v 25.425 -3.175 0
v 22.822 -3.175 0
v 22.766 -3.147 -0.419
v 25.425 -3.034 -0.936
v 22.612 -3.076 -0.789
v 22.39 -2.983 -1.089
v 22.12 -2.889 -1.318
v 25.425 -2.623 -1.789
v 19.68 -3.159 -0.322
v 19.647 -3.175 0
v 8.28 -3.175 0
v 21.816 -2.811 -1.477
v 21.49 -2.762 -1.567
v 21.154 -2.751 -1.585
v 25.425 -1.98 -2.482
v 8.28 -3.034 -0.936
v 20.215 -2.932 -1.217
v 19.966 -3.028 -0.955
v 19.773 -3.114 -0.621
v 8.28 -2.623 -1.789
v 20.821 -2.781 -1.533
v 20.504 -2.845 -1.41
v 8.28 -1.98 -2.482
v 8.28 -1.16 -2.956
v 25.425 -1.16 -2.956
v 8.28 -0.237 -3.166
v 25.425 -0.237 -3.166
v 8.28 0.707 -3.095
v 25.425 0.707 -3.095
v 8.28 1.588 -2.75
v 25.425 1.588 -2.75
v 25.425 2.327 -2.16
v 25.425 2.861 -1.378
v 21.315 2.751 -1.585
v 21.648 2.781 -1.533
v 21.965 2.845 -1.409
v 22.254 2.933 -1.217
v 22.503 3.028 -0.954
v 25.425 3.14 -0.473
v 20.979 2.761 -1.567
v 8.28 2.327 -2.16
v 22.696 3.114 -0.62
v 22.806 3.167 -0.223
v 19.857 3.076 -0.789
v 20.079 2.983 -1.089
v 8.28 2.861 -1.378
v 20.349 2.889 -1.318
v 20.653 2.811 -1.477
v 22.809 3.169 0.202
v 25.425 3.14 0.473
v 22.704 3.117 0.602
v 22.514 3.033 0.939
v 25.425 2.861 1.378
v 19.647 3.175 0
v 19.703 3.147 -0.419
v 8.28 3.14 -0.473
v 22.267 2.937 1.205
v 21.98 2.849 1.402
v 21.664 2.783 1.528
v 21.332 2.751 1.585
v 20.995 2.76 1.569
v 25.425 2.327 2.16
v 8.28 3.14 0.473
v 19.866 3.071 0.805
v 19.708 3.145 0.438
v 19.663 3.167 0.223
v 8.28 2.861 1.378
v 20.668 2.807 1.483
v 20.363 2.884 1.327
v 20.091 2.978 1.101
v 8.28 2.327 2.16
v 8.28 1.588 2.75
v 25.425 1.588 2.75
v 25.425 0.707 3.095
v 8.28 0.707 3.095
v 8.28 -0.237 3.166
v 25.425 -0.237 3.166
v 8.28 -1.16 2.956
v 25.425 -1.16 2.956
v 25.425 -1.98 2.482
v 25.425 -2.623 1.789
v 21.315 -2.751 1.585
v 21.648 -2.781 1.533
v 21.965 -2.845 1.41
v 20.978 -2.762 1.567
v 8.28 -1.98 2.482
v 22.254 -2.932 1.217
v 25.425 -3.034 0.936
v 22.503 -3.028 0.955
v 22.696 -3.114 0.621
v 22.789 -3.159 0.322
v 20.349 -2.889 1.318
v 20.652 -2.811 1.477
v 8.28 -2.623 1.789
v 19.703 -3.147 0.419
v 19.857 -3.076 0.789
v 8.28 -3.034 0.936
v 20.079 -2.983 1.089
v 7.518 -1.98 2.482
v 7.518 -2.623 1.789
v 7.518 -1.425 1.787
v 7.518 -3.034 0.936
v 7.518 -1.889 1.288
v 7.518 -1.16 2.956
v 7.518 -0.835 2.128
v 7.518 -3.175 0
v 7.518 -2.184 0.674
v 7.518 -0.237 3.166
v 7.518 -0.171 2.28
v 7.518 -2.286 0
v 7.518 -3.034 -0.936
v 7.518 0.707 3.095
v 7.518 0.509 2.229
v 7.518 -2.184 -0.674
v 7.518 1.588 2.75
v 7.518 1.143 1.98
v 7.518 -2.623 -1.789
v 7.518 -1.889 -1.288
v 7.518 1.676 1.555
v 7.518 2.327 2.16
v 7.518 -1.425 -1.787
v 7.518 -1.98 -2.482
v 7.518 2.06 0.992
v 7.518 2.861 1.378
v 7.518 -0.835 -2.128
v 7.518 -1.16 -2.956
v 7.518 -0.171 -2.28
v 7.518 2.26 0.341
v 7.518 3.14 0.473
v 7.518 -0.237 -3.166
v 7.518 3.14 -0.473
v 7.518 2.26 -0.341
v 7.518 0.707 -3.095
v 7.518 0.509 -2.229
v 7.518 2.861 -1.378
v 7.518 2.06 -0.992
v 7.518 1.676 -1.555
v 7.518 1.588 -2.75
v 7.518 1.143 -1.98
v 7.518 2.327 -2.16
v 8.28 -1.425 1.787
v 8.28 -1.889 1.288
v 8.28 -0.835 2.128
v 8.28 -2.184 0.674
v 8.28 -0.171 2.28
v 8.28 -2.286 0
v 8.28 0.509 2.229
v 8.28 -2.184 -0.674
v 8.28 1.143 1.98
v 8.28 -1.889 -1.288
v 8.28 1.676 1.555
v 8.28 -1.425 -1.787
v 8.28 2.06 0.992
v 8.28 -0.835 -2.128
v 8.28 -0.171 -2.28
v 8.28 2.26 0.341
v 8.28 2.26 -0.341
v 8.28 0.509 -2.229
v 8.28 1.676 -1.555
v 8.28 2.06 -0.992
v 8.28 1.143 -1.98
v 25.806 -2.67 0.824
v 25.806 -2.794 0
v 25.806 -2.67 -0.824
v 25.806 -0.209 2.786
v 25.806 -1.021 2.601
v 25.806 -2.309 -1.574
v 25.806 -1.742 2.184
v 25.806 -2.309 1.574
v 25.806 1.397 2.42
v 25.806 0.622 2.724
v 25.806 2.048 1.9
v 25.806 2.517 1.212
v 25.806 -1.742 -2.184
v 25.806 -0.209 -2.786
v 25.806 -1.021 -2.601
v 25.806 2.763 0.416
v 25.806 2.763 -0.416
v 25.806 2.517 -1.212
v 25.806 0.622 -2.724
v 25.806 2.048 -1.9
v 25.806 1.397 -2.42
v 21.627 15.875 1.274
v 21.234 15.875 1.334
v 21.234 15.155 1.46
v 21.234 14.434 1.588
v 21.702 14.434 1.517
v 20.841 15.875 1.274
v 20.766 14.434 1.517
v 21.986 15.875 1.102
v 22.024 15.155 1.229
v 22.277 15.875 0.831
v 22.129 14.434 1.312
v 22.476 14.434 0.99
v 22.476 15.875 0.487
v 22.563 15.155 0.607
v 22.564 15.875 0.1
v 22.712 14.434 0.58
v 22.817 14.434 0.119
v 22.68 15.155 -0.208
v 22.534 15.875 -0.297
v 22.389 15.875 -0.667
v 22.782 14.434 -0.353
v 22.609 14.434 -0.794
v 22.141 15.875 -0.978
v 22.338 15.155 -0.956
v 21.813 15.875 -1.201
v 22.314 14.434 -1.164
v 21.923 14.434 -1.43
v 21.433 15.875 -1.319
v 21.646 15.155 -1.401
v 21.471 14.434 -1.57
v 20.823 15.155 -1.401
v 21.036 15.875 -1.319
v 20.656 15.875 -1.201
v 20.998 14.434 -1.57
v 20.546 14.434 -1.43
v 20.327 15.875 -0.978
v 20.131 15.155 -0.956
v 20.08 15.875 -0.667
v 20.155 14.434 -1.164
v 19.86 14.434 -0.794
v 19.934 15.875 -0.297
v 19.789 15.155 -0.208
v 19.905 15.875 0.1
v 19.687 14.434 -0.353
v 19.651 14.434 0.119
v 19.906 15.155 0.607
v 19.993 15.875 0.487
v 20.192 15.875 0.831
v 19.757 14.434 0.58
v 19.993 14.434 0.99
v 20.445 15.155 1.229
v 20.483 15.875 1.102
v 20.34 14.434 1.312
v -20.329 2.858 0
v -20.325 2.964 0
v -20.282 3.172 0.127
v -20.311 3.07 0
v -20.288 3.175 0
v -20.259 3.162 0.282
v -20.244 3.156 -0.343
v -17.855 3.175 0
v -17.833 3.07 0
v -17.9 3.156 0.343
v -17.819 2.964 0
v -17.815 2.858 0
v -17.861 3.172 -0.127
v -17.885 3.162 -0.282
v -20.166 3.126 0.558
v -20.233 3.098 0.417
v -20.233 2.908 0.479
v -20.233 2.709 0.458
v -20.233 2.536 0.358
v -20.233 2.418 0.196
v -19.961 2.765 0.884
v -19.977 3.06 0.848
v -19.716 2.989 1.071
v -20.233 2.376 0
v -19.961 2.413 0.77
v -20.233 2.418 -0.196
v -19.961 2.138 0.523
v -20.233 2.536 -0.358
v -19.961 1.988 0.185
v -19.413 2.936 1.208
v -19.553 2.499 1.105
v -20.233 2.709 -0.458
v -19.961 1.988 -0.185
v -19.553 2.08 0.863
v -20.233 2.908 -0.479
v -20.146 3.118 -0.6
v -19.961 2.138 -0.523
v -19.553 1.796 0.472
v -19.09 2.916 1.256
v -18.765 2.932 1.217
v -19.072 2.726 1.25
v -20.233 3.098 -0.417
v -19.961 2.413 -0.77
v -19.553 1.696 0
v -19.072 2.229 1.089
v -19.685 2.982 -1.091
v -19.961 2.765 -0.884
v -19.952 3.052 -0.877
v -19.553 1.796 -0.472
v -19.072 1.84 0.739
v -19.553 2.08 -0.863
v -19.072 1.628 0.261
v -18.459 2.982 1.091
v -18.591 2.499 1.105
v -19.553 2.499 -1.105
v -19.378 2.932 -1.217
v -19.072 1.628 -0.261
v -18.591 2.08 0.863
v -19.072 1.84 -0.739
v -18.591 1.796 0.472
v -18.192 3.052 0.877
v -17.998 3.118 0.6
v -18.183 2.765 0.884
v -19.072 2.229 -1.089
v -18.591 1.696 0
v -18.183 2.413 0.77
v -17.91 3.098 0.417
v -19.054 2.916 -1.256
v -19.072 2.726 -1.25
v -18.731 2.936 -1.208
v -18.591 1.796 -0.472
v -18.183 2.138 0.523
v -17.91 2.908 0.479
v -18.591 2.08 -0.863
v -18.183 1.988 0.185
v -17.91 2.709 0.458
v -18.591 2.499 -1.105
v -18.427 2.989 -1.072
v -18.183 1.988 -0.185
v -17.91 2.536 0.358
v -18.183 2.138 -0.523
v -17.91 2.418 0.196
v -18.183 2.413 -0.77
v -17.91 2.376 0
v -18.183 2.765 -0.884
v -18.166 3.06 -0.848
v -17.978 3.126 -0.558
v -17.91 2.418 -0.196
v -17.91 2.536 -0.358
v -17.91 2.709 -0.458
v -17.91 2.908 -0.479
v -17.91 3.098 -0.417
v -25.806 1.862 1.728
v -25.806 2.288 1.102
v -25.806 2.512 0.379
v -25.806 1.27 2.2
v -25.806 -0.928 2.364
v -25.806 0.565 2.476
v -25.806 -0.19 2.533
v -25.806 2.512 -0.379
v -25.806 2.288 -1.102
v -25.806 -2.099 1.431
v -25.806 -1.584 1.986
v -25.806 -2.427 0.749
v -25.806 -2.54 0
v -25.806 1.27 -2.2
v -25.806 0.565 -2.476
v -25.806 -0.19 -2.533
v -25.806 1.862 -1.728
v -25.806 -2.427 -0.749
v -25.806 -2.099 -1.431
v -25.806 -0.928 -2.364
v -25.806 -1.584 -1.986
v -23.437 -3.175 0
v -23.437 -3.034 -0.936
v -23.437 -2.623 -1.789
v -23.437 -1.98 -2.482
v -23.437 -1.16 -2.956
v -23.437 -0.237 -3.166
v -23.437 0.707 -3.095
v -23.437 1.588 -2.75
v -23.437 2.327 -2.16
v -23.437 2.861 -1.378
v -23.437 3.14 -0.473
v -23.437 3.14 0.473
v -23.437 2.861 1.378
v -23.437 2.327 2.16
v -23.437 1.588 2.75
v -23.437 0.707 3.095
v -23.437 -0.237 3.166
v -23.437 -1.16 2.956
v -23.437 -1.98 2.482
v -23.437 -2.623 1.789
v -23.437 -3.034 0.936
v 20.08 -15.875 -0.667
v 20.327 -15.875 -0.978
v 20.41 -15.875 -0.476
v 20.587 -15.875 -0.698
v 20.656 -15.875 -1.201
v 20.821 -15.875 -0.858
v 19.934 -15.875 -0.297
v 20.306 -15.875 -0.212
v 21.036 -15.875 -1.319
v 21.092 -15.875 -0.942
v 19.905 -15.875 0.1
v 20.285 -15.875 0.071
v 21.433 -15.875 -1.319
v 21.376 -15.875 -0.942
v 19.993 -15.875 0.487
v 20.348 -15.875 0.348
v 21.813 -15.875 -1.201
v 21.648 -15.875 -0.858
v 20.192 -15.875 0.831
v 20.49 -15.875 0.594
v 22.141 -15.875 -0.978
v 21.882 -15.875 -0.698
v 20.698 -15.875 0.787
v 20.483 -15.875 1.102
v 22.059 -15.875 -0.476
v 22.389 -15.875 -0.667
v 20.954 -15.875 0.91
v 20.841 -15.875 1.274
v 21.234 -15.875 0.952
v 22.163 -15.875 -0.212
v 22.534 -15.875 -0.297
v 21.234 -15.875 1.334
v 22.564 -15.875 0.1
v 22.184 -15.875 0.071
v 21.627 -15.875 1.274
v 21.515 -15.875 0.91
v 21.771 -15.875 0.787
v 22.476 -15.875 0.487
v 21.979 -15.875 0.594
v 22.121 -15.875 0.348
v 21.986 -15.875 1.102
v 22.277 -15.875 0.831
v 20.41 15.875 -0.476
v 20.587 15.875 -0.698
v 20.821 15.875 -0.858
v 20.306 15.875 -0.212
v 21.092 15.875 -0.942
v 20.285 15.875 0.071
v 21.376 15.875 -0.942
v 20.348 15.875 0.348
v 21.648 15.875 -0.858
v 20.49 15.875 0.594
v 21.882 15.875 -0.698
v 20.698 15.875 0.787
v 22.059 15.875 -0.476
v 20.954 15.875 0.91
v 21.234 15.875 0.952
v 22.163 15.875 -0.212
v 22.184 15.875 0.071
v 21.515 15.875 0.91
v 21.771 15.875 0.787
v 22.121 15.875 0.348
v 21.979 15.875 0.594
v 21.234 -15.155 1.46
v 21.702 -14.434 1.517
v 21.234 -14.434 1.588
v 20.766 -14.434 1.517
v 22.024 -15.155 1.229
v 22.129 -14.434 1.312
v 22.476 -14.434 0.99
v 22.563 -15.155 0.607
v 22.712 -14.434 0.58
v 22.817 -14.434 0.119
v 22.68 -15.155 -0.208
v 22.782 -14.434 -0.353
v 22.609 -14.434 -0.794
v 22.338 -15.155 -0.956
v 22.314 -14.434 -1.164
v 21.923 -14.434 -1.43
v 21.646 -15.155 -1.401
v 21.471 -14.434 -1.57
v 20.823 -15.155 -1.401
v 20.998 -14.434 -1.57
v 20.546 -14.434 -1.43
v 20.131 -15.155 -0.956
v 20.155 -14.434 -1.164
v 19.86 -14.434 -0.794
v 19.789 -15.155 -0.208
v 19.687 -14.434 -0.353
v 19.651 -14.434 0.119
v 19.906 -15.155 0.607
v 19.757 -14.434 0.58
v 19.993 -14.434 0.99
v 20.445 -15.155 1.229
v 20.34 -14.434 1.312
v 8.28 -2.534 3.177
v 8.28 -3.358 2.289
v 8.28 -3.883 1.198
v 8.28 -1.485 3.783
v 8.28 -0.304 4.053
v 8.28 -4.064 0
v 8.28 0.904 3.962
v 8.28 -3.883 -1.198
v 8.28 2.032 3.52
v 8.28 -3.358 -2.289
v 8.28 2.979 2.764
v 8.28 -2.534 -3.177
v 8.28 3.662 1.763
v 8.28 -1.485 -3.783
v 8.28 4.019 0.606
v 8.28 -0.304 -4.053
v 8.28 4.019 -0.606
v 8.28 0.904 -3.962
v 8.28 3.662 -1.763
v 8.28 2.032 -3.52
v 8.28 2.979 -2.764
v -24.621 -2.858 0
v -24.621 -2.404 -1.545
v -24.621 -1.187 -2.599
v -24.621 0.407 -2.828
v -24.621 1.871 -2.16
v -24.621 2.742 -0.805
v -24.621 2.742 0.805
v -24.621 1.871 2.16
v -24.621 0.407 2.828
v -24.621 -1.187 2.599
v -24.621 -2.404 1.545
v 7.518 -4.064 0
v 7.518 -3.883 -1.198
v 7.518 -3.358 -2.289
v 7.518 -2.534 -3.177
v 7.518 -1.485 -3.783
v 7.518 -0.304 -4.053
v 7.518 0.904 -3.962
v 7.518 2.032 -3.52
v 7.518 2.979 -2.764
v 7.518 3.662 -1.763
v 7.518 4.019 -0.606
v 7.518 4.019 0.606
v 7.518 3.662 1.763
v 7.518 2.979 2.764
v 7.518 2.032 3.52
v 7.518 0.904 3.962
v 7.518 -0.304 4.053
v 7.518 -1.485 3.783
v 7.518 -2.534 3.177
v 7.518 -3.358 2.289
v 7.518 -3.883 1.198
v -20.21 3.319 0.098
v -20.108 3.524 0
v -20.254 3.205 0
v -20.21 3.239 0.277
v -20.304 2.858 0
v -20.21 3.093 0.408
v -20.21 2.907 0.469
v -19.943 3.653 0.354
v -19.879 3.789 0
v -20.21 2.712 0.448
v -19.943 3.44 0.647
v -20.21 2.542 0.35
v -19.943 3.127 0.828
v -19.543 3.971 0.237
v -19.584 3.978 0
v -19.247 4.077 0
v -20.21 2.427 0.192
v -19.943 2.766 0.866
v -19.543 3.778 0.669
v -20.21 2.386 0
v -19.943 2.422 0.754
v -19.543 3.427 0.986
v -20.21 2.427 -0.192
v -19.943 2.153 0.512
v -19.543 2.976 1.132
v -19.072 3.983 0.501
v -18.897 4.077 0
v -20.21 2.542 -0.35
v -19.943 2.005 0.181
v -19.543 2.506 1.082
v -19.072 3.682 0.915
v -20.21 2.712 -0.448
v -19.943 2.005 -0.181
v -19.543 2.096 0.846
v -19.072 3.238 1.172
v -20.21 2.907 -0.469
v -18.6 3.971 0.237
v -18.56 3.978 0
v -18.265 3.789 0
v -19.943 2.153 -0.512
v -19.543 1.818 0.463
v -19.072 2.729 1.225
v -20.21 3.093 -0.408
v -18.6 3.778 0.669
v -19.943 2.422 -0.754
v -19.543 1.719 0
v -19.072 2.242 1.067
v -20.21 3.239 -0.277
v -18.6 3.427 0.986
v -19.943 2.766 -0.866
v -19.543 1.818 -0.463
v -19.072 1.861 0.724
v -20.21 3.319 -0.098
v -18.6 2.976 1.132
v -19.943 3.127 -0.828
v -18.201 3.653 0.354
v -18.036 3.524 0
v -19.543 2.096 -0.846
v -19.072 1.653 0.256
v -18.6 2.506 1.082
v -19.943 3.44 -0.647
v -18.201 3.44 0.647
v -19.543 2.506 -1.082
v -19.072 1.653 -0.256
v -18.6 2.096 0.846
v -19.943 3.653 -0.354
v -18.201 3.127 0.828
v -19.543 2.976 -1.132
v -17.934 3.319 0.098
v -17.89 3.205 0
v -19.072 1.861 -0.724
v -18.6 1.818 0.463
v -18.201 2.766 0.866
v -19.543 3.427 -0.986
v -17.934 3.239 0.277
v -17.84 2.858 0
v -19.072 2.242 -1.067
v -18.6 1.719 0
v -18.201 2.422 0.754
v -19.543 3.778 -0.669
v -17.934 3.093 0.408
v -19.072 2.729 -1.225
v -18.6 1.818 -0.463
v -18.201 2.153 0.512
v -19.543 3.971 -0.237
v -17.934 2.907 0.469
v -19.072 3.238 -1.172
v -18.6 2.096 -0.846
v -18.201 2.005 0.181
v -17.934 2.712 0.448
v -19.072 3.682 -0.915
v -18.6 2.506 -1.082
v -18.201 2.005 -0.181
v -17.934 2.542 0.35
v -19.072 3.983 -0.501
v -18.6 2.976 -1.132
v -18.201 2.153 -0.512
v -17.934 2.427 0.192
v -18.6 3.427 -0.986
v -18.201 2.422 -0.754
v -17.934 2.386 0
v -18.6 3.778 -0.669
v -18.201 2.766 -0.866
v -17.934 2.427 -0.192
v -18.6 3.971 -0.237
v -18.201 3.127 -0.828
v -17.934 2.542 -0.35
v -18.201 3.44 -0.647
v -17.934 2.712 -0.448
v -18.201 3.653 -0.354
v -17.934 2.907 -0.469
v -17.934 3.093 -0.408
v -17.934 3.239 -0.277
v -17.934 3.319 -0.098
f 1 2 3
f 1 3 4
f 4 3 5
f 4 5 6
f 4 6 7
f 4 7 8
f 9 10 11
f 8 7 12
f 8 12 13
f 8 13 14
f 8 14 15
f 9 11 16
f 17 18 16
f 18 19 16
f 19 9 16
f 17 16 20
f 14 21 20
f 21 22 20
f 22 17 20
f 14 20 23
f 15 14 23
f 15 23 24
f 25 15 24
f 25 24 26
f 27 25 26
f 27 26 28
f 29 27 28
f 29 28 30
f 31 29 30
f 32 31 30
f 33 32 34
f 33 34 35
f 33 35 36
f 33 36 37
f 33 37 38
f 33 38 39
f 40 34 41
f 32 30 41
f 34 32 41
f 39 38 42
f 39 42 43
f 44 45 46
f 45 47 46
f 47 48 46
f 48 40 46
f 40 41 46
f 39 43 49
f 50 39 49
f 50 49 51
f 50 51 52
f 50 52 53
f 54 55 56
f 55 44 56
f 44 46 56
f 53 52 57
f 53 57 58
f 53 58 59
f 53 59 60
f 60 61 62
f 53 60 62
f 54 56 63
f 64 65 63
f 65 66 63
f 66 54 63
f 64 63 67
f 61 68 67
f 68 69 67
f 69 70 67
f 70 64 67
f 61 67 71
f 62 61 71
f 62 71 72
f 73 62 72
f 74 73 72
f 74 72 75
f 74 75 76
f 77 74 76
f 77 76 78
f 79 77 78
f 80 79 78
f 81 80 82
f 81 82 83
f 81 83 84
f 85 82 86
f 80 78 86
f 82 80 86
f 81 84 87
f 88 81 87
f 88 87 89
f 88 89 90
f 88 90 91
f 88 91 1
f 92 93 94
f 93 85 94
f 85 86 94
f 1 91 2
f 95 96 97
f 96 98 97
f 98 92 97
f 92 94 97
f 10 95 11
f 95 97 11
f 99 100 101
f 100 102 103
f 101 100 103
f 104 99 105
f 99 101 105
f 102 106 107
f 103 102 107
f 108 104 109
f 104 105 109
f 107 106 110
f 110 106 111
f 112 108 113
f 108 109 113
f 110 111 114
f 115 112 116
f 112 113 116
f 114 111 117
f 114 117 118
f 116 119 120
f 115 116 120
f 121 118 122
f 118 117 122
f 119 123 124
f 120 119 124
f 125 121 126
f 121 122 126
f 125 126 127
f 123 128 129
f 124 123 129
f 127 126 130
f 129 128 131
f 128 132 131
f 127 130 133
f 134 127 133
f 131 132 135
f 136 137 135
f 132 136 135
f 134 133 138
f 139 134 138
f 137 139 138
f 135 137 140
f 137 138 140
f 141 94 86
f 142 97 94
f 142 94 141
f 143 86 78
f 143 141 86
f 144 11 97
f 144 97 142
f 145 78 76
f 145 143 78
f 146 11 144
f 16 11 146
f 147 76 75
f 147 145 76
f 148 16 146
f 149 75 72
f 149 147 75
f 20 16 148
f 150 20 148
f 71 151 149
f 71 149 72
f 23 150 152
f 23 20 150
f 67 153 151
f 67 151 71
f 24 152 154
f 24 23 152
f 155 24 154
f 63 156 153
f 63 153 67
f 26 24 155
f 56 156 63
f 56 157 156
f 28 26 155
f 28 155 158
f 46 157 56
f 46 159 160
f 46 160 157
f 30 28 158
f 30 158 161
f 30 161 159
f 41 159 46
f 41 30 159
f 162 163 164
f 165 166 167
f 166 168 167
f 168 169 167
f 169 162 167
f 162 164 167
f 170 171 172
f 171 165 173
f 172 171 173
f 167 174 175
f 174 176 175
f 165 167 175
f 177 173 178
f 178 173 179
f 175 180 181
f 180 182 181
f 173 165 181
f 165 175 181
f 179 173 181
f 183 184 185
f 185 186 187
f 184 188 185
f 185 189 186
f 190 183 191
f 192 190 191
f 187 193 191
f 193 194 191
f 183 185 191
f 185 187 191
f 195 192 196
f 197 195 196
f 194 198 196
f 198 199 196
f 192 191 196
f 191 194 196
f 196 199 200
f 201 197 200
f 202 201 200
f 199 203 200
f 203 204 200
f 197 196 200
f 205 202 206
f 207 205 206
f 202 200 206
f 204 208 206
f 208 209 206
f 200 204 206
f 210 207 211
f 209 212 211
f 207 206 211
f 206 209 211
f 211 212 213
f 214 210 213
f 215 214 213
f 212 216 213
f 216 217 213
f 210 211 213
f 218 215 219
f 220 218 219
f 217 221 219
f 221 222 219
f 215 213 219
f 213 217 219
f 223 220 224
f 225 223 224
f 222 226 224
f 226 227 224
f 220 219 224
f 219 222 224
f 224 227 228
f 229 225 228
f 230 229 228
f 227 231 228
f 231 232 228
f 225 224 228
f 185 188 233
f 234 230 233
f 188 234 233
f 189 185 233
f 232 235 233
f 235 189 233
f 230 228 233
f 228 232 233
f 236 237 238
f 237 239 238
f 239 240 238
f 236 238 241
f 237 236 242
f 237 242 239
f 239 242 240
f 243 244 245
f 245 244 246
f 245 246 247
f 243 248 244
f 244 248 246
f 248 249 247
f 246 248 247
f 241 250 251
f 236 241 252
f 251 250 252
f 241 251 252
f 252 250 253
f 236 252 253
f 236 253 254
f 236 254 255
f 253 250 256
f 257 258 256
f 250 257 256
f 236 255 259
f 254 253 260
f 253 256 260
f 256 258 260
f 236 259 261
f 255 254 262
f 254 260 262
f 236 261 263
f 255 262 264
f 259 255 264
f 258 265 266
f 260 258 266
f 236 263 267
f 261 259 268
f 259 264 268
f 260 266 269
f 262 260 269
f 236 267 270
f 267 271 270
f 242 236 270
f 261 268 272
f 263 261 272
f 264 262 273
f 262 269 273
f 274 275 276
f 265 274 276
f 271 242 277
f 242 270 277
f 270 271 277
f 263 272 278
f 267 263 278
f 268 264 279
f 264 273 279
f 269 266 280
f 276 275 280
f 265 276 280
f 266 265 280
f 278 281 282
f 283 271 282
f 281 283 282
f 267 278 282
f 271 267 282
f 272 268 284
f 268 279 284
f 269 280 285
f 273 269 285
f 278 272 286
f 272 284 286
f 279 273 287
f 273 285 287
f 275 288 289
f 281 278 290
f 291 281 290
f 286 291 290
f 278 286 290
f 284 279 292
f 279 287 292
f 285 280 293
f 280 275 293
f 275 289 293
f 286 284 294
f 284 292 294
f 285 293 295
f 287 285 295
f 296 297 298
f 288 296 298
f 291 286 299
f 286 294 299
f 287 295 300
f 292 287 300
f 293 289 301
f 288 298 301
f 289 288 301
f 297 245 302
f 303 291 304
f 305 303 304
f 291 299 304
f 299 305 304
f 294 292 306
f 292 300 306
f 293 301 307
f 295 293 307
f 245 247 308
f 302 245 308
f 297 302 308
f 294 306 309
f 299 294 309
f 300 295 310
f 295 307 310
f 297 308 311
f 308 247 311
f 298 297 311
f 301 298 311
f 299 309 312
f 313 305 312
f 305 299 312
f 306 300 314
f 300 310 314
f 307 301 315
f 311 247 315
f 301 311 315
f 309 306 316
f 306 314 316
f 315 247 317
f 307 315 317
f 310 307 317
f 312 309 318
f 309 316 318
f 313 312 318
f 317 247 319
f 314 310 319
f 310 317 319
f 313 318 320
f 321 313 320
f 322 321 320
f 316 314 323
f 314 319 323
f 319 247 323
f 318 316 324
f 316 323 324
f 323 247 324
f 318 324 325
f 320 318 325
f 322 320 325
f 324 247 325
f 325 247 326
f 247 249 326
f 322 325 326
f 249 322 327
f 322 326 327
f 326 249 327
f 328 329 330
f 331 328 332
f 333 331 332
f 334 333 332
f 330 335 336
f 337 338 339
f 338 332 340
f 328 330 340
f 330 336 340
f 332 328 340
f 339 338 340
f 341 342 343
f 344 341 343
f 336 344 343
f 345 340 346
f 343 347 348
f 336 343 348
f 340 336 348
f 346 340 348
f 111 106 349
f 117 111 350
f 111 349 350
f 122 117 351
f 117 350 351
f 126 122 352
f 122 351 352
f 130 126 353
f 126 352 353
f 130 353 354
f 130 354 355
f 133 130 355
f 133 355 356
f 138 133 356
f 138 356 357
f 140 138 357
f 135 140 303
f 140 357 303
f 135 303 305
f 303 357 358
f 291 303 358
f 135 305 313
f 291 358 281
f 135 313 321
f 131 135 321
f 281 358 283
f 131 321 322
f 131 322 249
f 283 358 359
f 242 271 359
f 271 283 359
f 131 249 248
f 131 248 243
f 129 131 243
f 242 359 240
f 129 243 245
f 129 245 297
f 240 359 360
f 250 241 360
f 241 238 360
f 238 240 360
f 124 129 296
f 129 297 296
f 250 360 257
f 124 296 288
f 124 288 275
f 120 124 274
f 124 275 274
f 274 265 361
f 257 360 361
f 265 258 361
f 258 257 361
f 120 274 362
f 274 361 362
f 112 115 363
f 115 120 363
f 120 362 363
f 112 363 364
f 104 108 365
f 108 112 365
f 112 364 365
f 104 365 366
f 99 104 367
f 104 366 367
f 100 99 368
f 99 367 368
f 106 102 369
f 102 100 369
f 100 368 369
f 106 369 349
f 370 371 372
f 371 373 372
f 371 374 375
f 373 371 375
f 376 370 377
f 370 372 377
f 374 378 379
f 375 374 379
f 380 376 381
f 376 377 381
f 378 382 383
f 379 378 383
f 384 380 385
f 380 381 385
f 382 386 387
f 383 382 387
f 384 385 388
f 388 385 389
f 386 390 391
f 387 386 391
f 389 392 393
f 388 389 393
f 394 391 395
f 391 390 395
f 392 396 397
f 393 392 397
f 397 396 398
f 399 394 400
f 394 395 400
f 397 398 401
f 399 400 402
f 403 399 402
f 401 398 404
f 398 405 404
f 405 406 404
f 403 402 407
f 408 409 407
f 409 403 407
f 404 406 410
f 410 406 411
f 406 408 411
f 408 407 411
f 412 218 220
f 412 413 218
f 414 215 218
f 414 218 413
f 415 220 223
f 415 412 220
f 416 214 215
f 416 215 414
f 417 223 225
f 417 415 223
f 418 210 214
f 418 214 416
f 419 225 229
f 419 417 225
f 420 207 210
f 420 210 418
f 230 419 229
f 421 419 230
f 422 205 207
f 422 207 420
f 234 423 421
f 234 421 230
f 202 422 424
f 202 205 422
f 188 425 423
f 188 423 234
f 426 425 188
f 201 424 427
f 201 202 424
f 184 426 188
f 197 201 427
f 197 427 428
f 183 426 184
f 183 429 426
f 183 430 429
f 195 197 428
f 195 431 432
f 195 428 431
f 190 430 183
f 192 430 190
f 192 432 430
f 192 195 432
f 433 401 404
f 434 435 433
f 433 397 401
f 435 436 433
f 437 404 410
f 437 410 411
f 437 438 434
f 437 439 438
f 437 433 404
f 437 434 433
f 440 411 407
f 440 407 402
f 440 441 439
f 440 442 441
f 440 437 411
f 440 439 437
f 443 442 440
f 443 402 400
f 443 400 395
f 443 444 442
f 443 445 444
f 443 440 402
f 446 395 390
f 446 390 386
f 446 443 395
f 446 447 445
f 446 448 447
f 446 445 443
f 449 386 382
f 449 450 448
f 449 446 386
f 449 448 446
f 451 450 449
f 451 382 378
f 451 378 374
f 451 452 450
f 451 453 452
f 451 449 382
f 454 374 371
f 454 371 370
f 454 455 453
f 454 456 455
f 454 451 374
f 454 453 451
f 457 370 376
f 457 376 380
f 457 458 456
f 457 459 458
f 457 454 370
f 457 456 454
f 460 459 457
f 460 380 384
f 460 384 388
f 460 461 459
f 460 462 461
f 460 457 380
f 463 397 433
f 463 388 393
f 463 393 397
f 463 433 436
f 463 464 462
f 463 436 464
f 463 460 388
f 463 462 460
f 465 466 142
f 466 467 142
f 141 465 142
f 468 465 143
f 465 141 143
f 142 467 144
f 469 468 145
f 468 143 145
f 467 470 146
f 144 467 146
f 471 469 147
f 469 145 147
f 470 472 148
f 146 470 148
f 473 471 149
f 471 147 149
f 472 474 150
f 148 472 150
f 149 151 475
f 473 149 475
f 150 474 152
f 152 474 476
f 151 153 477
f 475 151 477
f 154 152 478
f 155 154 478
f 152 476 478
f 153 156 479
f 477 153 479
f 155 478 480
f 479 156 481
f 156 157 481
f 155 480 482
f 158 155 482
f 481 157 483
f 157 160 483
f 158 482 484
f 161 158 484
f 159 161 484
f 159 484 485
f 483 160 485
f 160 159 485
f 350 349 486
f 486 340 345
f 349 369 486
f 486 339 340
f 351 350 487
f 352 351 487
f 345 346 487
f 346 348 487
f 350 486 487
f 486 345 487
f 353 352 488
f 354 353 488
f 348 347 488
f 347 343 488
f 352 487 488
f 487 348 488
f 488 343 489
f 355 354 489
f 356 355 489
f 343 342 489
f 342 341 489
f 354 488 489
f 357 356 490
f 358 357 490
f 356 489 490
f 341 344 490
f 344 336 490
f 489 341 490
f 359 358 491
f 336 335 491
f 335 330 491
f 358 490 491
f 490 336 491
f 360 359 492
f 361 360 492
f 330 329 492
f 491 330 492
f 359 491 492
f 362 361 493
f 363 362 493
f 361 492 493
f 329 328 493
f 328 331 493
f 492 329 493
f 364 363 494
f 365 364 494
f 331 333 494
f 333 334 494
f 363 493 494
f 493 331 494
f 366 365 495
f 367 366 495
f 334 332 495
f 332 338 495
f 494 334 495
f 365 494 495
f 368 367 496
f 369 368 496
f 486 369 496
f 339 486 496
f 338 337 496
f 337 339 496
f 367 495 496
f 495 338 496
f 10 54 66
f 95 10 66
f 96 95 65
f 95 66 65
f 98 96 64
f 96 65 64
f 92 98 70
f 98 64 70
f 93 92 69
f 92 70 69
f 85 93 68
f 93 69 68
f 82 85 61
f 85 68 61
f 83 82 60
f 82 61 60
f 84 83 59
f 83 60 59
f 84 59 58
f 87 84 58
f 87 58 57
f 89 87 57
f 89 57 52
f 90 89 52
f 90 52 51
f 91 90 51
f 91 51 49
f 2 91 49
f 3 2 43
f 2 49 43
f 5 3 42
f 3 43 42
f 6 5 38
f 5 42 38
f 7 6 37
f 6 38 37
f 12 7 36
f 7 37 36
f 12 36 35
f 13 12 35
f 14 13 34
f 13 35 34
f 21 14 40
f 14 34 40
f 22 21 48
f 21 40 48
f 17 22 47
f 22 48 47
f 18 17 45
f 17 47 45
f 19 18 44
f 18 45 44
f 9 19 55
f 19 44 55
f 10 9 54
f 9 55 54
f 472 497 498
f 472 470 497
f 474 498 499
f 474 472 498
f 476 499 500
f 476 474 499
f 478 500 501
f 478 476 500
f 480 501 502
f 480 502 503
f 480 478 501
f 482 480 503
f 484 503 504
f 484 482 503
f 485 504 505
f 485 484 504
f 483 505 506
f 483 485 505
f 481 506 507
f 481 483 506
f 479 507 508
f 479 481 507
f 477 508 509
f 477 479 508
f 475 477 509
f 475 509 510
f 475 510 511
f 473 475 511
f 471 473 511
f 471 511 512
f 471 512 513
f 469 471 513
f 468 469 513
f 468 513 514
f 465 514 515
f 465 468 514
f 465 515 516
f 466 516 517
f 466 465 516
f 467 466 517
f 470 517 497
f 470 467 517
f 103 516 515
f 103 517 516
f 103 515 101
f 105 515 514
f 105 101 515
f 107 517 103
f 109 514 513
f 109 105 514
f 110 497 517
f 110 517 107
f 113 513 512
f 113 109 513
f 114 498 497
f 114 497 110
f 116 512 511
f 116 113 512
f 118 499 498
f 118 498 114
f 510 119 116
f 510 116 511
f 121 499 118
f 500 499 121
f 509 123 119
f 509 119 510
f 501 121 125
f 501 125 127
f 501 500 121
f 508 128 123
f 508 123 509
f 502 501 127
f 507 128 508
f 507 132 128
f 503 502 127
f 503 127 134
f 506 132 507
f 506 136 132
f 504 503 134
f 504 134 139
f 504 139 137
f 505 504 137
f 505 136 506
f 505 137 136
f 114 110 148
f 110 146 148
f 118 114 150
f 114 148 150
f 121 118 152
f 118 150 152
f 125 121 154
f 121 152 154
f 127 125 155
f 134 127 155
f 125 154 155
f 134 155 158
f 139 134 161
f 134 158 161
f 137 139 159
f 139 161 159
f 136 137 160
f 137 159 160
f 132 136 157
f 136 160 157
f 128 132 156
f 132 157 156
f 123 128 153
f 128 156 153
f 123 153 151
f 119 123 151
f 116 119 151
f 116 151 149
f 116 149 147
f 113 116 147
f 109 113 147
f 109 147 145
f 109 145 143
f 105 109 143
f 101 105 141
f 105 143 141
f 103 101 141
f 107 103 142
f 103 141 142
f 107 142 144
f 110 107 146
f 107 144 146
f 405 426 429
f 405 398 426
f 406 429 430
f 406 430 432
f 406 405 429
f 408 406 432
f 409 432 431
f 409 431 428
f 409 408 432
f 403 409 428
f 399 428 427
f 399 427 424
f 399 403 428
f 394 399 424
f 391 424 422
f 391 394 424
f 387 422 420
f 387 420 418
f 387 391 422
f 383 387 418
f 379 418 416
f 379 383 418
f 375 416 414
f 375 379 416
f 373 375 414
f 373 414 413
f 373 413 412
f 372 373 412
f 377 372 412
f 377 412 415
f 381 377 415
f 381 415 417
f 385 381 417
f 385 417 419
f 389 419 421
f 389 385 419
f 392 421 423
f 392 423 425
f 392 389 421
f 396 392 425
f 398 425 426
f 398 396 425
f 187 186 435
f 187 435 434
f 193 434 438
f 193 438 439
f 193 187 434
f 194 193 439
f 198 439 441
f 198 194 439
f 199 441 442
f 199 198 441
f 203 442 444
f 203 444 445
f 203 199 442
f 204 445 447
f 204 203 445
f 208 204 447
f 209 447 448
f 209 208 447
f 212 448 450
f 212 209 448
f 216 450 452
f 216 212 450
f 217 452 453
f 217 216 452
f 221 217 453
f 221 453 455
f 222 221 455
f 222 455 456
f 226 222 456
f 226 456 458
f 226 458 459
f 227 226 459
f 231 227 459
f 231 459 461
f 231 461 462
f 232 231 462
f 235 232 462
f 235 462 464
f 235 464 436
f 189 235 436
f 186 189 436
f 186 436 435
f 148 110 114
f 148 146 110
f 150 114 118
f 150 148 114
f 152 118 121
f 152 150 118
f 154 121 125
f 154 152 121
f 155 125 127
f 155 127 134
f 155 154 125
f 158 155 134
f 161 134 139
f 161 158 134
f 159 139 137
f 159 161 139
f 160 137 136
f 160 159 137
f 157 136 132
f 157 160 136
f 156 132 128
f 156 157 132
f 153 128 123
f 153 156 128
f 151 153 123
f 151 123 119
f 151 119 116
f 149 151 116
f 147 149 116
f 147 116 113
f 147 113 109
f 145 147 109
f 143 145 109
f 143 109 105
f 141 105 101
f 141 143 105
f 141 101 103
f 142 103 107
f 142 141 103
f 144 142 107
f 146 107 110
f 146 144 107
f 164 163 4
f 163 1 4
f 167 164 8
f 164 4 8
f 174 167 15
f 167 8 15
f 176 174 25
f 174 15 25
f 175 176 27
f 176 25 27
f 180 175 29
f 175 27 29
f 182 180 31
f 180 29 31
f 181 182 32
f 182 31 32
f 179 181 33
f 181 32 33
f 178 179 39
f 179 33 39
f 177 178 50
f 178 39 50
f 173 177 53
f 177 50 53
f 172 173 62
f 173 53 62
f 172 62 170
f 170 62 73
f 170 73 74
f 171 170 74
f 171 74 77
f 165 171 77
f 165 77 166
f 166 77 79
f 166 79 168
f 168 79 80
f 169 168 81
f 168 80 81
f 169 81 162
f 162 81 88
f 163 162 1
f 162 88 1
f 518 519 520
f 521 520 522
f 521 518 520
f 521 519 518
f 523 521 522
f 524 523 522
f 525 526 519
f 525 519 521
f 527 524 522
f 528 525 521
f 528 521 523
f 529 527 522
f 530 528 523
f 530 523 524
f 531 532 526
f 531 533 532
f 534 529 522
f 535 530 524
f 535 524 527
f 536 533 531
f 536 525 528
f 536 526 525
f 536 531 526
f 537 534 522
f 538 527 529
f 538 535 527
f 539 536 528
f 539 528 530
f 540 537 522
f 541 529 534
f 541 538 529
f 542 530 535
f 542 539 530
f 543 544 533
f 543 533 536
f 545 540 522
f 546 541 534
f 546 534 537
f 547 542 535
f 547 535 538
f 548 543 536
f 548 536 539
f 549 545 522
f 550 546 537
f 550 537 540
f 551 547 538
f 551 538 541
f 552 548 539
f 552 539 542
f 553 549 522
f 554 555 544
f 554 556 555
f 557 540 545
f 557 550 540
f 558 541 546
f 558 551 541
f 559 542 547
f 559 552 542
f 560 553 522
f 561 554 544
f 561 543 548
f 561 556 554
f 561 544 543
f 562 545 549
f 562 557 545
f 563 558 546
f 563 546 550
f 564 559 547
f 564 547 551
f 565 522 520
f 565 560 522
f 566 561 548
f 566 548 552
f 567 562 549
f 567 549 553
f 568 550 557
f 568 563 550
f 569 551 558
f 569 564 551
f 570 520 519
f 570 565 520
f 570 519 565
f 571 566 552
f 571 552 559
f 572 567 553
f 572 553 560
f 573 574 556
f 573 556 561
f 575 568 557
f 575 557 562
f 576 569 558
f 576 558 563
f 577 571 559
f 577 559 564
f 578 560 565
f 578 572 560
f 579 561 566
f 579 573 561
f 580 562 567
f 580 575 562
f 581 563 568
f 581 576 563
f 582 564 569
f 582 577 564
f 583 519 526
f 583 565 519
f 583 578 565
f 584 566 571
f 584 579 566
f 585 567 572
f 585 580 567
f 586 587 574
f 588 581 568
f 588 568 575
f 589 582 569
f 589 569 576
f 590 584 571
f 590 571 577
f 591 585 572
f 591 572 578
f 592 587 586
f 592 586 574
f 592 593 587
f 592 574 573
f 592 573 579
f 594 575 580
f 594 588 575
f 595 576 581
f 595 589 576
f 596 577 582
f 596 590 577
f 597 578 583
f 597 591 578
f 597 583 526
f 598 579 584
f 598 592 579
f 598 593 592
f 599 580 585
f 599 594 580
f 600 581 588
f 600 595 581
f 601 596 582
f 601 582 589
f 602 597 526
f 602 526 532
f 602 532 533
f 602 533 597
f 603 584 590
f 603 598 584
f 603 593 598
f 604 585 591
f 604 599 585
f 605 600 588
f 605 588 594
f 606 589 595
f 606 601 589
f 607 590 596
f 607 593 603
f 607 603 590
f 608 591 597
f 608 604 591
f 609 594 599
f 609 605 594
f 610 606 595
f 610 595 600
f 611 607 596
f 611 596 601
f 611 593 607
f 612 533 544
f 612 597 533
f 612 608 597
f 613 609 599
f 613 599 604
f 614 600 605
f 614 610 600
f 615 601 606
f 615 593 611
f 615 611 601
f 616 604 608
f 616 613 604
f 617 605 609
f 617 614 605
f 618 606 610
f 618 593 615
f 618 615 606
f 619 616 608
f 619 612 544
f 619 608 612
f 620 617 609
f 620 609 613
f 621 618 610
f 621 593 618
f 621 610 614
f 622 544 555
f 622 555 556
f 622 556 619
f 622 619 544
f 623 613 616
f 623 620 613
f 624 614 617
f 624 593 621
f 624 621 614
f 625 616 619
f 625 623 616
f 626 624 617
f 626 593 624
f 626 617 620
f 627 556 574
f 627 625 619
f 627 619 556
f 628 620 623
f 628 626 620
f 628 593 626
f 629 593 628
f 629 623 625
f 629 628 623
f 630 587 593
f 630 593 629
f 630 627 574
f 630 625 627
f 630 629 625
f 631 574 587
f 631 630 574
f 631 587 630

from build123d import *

# Parameters (mm, degrees)
SKETCH4_W      = 1.5875
SKETCH4_H      = 6.35
SKETCH5_W      = 0.762
SKETCH5_H      = 1.778
SKETCH5_2_W    = 0.762
SKETCH5_2_H    = 1.778
SKETCH6_R      = 1.5875
SKETCH6_R_2    = 0.9525
EXTRUDE1_DEPTH = 15.875
CHAMFER1_SIZE  = 0.254
CHAMFER1_SIZE2 = 1.440505582
CHAMFER2_SIZE  = 0.254
CHAMFER2_SIZE2 = 1.440505582


with BuildPart() as part:
    # Sketch1 → Revolve1 (revolve)
    with BuildSketch(Plane.XY, mode=Mode.PRIVATE) as revolve1_sk:
        Polygon((25.8064, 2.794), (25.4254, 3.175), (-23.436547737, 3.175), (-25.8064, 2.54), (-25.8064, 0), (25.8064, 0), align=None)
    revolve(revolve1_sk.sketch.rotate(Axis((25.8064, 0, 0), (1, 0, 0)), 180), axis=Axis((25.8064, 0, 0), (1, 0, 0)))  # turned: the seam where the file's is

    # Sketch2 → Cut-Revolve1 (revolve, cut)
    with BuildSketch(Plane.XY):
        with BuildLine():
            Line((-17.814582051, 2.8575), (-20.329182051, 2.8575))
            ThreePointArc((-20.329182051, 2.8575), (-19.071882051, 4.1148), (-17.814582051, 2.8575))
        make_face()
    revolve(axis=Axis((-17.814582051, 2.8575, 0), (1, 0, 0)), mode=Mode.SUBTRACT)

    # Sketch4 → Cut-Revolve2 (revolve, cut)
    with BuildSketch(Plane.XY, mode=Mode.PRIVATE) as cut_revolve2_sk:
        with Locations((22.02815, 0)):
            Rectangle(SKETCH4_W, SKETCH4_H)
    revolve(cut_revolve2_sk.sketch.rotate(Axis((21.2344, -3.175, 0), (0, 1, 0)), 180), axis=Axis((21.2344, -3.175, 0), (0, 1, 0)), mode=Mode.SUBTRACT)  # turned: the seam where the file's is

    # Sketch5 → Cut-Revolve3 (revolve, cut)
    with BuildSketch(Plane.XY, mode=Mode.PRIVATE) as cut_revolve3_sk:
        with Locations((7.8994, 3.175)):
            Rectangle(SKETCH5_W, SKETCH5_H)
    revolve(cut_revolve3_sk.sketch.rotate(Axis((7.5184, 0, 0), (1, 0, 0)), 180), axis=Axis((7.5184, 0, 0), (1, 0, 0)), mode=Mode.SUBTRACT)  # turned: the seam where the file's is


with BuildPart() as body_2:
    # Sketch3 → Revolve2 (revolve)
    with BuildSketch(Plane.XY):
        with BuildLine():
            Line((-17.839982051, 2.8575), (-20.303782051, 2.8575))
            ThreePointArc((-20.303782051, 2.8575), (-19.071882051, 4.0894), (-17.839982051, 2.8575))
        make_face()
    revolve(axis=Axis((-17.839982051, 2.8575, 0), (1, 0, 0)))


with BuildPart() as body_3:
    # Sketch5_2 → Revolve3 (revolve)
    with BuildSketch(Plane.XY, mode=Mode.PRIVATE) as revolve3_sk:
        with Locations((7.8994, 3.175)):
            Rectangle(SKETCH5_2_W, SKETCH5_2_H)
    revolve(revolve3_sk.sketch.rotate(Axis((7.5184, 0, 0), (1, 0, 0)), 180), axis=Axis((7.5184, 0, 0), (1, 0, 0)))  # turned: the seam where the file's is


with BuildPart() as body_4:
    # Sketch6 → Extrude1 (new body, symmetric)
    with BuildSketch(Plane(origin=(0, 0, 0), x_dir=(1, 0, 0), z_dir=(0, 1, 0))):
        with Locations(Location((21.2344, 0, 0), (0, 0, 270))):  # turned: the seam where the file's is
            Circle(SKETCH6_R)
        with Locations(Location((21.2344, 0, 0), (0, 0, 270))):  # turned: the seam where the file's is
            Circle(SKETCH6_R_2, mode=Mode.SUBTRACT)
    extrude(amount=EXTRUDE1_DEPTH, both=True)

    # Chamfer1
    chamfer1_edges = [body_4.edges().sort_by_distance(p)[0] for p in [
        (21.2344, 15.875, -1.5875),
    ]]
    chamfer1_side = [body_4.faces().sort_by_distance(p)[0] for p in [
        (21.2344, 15.875, -1.542598719),
    ]]
    chamfer(chamfer1_edges, length=CHAMFER1_SIZE, length2=CHAMFER1_SIZE2, reference=chamfer1_side[0])

    # Chamfer2
    chamfer2_edges = [body_4.edges().sort_by_distance(p)[0] for p in [
        (21.2344, -15.875, -1.5875),
    ]]
    chamfer2_side = [body_4.faces().sort_by_distance(p)[0] for p in [
        (21.2344, -15.875, -1.542598719),
    ]]
    chamfer(chamfer2_edges, length=CHAMFER2_SIZE, length2=CHAMFER2_SIZE2, reference=chamfer2_side[0])


solid = Compound([part.part, body_2.part, body_3.part, body_4.part])
